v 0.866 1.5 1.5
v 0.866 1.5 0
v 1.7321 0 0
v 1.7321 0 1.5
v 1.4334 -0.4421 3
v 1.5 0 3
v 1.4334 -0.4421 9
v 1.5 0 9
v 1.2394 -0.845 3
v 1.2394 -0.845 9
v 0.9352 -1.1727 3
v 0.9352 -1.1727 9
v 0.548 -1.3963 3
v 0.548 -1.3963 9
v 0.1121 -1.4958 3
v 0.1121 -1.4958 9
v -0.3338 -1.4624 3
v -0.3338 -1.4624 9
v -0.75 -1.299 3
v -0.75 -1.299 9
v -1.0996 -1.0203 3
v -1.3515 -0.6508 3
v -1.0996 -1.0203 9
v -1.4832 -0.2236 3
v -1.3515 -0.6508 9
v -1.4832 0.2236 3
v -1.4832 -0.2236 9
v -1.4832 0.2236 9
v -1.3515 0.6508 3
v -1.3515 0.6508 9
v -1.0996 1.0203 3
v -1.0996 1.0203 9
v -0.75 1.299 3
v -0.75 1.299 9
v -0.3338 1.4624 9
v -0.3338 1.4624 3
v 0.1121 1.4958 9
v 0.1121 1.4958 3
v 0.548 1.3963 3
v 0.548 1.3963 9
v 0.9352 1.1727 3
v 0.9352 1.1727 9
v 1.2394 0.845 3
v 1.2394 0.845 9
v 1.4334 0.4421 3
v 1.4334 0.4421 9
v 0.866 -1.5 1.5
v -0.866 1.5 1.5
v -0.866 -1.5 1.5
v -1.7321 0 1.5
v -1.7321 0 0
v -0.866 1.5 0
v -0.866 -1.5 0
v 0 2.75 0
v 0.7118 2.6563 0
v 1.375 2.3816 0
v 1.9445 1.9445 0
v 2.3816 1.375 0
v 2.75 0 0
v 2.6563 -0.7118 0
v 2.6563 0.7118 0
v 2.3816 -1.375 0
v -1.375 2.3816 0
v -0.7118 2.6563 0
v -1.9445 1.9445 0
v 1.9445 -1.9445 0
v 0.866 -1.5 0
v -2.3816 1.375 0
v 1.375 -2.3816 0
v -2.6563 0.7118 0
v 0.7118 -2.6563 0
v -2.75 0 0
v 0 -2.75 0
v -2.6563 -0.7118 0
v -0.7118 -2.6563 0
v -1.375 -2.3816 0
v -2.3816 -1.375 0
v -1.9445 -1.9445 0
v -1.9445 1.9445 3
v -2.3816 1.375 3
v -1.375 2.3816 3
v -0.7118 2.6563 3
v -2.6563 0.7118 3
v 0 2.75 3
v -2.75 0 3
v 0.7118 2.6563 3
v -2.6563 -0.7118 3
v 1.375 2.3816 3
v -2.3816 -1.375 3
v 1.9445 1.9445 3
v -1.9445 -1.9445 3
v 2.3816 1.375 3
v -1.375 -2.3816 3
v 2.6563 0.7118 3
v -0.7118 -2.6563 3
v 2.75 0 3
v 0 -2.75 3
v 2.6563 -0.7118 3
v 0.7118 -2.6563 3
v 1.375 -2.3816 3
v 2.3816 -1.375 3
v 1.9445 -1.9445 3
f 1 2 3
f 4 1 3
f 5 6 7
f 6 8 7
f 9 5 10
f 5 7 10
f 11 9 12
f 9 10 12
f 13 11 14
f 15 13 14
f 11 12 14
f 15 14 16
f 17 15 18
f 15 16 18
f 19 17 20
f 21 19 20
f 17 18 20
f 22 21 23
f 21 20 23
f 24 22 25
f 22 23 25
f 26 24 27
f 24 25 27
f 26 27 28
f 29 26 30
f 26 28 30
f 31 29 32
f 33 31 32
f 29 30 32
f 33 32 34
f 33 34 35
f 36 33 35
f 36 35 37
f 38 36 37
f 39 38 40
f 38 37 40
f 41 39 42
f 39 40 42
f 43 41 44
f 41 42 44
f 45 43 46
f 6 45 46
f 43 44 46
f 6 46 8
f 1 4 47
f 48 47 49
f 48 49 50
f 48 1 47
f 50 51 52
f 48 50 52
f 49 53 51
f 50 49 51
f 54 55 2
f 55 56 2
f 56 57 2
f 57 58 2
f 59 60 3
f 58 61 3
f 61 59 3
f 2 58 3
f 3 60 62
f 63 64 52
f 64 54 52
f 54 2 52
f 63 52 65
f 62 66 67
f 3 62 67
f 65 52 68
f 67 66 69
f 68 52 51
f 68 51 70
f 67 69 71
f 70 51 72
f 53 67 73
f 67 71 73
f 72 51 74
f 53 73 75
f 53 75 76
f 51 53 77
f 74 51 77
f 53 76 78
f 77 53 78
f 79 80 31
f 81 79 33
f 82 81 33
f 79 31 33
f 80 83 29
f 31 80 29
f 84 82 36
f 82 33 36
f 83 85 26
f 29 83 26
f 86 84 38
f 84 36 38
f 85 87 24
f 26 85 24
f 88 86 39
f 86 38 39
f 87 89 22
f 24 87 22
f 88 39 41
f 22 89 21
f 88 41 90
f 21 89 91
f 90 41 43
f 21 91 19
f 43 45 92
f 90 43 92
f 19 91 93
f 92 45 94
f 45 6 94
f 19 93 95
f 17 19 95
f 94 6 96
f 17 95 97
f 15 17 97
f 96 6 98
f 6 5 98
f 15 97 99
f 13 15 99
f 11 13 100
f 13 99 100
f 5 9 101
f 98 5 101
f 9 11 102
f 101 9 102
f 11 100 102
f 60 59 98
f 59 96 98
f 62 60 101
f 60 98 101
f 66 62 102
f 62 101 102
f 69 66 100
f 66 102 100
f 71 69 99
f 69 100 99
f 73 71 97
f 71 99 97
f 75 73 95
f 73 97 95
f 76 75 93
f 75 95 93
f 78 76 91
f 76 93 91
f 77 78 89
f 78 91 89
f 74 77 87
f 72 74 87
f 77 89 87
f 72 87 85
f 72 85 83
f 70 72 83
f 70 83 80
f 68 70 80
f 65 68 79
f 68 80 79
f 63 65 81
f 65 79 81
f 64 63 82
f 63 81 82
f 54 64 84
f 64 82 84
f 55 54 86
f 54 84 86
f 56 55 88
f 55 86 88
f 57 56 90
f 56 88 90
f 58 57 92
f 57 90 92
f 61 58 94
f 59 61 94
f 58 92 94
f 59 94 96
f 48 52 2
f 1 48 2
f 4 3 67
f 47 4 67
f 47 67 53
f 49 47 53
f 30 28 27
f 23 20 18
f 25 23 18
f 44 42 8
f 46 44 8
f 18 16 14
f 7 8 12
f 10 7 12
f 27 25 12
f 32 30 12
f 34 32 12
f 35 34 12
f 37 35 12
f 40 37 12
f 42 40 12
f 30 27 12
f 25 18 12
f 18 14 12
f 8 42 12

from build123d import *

# Parameters (mm, degrees)
CORTE_EXTRUS_O1_DEPTH = 1.5


with BuildPart() as part:
    # Esboço1 → Revolução1 (revolve)
    with BuildSketch(Plane(origin=(0, 0, 0), x_dir=(1, 0, 0), z_dir=(0, 1, 0))):
        Polygon((0, 0), (2.75, 0), (2.75, -3), (1.5, -3), (1.5, -9), (0, -9), (0, -3), align=None)
    revolve(axis=Axis((0, 0, 3), (0, 0, -1)))

    # Esboço2 → Corte-extrusão1 (cut)
    with BuildSketch(Plane(origin=(0, 0, 0), x_dir=(-1, 0, 0), z_dir=(0, 0, -1))):
        Polygon((1.732050808, 0), (0.866025404, 1.5), (-0.866025404, 1.5), (-1.732050808, 0), (-0.866025404, -1.5), (0.866025404, -1.5), align=None)
    extrude(amount=-CORTE_EXTRUS_O1_DEPTH, mode=Mode.SUBTRACT)


solid = part.part
